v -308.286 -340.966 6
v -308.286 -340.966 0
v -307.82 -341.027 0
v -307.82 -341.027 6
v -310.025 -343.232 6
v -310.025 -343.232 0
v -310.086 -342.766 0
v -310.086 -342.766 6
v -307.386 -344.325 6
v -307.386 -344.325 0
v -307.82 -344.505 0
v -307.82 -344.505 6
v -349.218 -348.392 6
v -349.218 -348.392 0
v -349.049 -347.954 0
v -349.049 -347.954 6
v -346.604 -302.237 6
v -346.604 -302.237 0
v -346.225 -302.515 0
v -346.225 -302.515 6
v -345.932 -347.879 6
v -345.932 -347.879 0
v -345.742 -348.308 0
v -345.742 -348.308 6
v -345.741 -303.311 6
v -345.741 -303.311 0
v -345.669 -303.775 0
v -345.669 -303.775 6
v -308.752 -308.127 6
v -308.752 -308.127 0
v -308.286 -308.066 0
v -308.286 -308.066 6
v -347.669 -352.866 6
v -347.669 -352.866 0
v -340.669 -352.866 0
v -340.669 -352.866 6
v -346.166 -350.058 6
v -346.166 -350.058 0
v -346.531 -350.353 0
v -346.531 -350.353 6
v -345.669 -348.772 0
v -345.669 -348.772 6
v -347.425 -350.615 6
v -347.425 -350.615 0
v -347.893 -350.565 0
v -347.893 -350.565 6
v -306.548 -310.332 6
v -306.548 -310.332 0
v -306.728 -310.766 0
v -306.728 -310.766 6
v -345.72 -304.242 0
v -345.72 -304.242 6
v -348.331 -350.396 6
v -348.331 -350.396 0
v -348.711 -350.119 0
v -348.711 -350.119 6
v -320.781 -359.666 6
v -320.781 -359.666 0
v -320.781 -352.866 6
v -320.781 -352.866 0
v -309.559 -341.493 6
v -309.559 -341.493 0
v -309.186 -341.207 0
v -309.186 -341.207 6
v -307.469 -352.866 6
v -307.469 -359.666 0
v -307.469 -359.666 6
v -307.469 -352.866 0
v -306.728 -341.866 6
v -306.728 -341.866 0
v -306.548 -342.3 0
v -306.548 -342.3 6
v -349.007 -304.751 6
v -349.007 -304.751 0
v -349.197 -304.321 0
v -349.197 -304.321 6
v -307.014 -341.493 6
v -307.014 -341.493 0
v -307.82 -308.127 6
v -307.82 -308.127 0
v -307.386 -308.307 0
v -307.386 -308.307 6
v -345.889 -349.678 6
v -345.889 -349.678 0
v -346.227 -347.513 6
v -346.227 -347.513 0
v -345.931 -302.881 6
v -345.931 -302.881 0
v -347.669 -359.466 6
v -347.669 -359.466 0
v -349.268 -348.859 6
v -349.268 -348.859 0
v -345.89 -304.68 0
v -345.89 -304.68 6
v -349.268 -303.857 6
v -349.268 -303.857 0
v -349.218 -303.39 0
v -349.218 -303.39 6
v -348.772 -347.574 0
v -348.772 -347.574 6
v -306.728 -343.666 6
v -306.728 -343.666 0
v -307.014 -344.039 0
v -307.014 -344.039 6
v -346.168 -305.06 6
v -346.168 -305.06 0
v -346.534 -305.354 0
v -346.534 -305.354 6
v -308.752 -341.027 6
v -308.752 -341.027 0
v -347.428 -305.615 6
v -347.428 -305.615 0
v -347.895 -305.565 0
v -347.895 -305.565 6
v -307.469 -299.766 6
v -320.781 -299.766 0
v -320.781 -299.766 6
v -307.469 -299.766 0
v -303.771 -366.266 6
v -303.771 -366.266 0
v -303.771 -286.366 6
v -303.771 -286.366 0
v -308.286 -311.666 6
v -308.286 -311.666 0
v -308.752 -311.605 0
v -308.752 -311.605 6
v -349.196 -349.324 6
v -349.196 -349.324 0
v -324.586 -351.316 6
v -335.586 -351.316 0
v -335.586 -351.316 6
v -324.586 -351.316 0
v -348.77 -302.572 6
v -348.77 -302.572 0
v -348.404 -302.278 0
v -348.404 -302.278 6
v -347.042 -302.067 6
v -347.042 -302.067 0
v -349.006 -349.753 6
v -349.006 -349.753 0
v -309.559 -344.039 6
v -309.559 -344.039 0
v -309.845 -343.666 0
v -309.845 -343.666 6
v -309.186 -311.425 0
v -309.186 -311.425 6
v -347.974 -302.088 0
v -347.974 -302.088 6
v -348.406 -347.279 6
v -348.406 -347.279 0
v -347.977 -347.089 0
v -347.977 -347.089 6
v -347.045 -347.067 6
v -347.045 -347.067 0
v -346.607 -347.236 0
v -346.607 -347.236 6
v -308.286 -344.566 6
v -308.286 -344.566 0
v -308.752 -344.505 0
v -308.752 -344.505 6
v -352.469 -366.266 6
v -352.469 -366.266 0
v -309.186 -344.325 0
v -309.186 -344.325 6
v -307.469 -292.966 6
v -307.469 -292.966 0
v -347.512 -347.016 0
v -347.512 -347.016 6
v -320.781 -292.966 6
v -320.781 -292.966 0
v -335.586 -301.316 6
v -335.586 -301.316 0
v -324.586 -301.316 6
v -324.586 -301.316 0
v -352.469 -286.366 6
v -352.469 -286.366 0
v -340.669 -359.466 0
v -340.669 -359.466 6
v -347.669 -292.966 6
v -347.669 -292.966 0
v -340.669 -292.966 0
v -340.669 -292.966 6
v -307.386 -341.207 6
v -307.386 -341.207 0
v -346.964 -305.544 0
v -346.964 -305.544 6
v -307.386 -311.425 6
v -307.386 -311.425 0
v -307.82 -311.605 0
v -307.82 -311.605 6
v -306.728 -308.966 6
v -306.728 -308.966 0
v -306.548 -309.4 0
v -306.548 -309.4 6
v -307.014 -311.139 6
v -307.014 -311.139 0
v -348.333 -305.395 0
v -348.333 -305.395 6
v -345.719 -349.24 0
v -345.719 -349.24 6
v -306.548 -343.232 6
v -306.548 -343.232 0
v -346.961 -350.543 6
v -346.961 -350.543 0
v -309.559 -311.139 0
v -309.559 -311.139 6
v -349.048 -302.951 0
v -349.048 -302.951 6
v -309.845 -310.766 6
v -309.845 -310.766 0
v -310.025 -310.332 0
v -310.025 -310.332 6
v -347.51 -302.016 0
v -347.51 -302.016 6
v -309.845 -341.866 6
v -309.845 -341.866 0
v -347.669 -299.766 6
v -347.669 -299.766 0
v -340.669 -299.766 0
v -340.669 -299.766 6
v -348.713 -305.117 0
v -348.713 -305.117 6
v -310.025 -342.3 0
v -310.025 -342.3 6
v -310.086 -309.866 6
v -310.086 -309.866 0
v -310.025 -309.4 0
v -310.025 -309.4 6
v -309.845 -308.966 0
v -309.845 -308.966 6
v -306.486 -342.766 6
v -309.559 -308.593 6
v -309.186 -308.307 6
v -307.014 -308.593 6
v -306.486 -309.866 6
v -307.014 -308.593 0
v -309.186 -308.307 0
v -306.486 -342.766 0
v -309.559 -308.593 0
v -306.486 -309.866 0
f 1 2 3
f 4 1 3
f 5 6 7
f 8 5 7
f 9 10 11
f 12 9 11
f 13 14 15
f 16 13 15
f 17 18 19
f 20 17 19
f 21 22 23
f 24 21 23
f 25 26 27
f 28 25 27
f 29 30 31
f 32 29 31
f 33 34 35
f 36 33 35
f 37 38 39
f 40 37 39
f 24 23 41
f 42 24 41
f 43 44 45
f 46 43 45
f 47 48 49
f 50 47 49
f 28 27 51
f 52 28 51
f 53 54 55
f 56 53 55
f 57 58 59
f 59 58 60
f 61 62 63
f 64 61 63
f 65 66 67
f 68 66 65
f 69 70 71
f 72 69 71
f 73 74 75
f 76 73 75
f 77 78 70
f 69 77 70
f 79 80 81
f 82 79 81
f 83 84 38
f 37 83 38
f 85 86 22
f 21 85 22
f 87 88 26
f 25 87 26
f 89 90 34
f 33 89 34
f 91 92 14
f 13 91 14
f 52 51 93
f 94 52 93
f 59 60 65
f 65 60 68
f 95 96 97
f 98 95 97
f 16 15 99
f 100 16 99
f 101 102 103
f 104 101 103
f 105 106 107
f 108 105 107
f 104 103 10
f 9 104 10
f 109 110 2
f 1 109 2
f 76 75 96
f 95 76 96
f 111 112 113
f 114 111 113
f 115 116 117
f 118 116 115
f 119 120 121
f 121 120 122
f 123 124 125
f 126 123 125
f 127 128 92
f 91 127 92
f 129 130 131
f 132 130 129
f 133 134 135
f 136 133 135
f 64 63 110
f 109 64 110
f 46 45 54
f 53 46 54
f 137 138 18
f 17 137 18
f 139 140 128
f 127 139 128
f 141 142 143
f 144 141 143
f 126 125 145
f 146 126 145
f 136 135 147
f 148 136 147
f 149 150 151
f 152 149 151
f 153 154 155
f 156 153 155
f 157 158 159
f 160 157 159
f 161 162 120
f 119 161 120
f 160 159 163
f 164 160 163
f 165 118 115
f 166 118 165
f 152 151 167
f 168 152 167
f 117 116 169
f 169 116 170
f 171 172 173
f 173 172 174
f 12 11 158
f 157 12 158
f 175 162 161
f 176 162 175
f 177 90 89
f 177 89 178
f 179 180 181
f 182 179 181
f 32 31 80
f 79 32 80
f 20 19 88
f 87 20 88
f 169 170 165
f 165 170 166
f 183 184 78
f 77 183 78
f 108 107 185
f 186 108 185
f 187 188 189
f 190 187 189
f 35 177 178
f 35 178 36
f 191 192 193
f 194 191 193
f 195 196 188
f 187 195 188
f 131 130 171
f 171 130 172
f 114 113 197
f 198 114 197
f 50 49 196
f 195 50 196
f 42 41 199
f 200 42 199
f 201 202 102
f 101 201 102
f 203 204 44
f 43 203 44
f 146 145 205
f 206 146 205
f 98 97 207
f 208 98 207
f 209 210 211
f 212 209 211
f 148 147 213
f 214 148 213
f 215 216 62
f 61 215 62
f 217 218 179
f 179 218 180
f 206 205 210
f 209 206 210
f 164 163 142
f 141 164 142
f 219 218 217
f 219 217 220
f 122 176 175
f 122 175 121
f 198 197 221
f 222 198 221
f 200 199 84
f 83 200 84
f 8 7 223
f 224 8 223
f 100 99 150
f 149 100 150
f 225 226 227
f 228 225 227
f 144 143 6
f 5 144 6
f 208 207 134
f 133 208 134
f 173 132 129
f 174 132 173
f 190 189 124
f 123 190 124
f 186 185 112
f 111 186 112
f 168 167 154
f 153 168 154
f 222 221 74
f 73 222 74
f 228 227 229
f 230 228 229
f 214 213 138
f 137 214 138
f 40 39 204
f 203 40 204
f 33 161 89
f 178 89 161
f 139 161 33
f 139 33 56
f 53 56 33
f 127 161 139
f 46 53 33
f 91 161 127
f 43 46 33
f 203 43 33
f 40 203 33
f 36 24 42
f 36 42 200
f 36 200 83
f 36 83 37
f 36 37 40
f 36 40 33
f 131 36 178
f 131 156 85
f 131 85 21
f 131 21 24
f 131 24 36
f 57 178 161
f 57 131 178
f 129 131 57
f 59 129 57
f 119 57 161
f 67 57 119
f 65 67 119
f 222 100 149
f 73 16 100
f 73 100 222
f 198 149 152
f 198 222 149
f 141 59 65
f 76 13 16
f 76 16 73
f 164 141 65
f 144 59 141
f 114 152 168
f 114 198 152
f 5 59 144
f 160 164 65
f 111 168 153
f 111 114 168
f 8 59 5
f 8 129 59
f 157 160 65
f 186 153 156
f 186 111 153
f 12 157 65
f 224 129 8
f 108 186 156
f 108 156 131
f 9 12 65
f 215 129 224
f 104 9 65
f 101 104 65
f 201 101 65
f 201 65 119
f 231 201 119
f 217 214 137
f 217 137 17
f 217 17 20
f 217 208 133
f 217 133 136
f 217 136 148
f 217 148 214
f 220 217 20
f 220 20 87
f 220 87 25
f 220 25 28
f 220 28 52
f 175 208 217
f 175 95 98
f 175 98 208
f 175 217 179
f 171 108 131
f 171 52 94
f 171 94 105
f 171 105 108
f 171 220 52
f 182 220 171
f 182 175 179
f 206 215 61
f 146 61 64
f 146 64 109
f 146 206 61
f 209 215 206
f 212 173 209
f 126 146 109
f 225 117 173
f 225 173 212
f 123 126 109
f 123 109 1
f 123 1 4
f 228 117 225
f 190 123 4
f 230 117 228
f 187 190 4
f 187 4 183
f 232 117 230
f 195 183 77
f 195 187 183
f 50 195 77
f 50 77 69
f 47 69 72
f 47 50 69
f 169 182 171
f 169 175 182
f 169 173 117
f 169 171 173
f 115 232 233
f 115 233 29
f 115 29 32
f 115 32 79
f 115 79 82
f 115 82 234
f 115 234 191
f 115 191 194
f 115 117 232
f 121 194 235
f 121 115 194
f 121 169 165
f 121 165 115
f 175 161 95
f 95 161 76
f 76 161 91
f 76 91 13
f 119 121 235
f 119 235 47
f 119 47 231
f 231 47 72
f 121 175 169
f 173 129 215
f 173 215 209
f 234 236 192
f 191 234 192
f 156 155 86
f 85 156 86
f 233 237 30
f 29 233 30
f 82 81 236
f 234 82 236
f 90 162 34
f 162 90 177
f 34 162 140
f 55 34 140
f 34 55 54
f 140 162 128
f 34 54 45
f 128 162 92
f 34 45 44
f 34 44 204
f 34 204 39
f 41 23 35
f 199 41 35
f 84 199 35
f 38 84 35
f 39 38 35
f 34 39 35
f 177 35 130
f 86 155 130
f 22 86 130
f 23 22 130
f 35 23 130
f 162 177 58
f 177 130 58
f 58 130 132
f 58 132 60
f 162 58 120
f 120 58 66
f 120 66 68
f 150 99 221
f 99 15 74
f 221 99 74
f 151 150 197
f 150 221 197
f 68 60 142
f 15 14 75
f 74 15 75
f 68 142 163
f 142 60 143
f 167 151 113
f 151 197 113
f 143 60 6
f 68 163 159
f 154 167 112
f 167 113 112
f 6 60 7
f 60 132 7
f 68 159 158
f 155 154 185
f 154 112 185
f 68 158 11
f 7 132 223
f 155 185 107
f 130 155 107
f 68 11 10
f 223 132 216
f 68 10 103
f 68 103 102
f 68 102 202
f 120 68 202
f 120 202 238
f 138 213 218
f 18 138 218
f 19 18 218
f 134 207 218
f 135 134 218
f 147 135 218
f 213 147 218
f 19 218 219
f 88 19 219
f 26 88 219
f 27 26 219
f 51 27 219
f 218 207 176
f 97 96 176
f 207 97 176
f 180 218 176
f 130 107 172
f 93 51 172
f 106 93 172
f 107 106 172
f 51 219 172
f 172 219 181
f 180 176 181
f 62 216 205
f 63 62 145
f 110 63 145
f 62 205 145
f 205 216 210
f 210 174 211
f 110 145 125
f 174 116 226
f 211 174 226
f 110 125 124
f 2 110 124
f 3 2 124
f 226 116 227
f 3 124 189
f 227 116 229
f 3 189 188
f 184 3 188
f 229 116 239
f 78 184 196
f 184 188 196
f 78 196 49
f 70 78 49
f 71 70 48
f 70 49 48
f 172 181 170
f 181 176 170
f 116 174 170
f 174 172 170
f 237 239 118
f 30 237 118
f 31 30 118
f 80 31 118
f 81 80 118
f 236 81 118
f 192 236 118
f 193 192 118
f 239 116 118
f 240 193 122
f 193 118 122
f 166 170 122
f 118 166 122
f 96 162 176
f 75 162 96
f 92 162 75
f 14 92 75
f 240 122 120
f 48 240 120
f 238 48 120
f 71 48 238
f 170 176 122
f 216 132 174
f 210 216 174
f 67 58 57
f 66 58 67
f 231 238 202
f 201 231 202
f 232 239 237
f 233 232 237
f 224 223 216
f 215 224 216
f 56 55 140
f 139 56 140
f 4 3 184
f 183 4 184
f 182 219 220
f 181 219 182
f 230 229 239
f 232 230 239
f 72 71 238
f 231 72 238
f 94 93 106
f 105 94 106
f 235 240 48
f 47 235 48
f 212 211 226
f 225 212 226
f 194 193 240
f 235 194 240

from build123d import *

# Parameters (mm, degrees)
SKETCH1_W           = 48.698269881
SKETCH1_H           = 79.9
SKETCH1_W_2         = 13.312275424
SKETCH1_H_2         = 6.8
SKETCH1_W_3         = 7
SKETCH1_H_3         = 6.6
SKETCH1_W_4         = 10.999995004
SKETCH1_H_4         = 49.999979698
BOSS_EXTRUDE1_DEPTH = 6


with BuildPart() as part:
    # Sketch1 → Boss-Extrude1 (new body)
    with BuildSketch(Plane.XY):
        with Locations((-328.119749272, -326.315940756)):
            Rectangle(SKETCH1_W, SKETCH1_H)
        Polygon((-306.547681314, -310.331815037), (-306.727502074, -310.765940756), (-307.013555595, -311.138732962), (-307.386347801, -311.424786483), (-307.82047352, -311.604607243), (-308.286347801, -311.665940756), (-308.752222082, -311.604607243), (-309.186347801, -311.424786483), (-309.559140007, -311.138732962), (-309.845193528, -310.765940756), (-310.025014288, -310.331815037), (-310.086347801, -309.865940756), (-310.025014288, -309.400066475), (-309.845193528, -308.965940756), (-309.559140007, -308.59314855), (-309.186347801, -308.307095029), (-308.752222082, -308.127274269), (-308.286347801, -308.065940756), (-307.82047352, -308.127274269), (-307.386347801, -308.307095029), (-307.013555595, -308.59314855), (-306.727502074, -308.965940756), (-306.547681314, -309.400066475), (-306.486347801, -309.865940756), align=None, mode=Mode.SUBTRACT)
        with Locations((-314.125021924, -356.265940756)):
            Rectangle(SKETCH1_W_2, SKETCH1_H_2, mode=Mode.SUBTRACT)
        with Locations((-344.168884212, -356.165940756)):
            Rectangle(SKETCH1_W_3, SKETCH1_H_3, mode=Mode.SUBTRACT)
        with Locations((-314.125021924, -296.365940756)):
            Rectangle(SKETCH1_W_2, SKETCH1_H_2, mode=Mode.SUBTRACT)
        Polygon((-349.005509995, -349.753374061), (-349.195776334, -349.323723778), (-349.268357829, -348.859468921), (-349.218308171, -348.392247692), (-349.04903816, -347.953900444), (-348.77208327, -347.574299819), (-348.406317517, -347.279314973), (-347.976667234, -347.089048634), (-347.512412377, -347.016467139), (-347.045191148, -347.066516797), (-346.6068439, -347.235786808), (-346.227243275, -347.512741698), (-345.932258429, -347.878507451), (-345.74199209, -348.308157734), (-345.669410595, -348.772412591), (-345.719460253, -349.23963382), (-345.888730263, -349.677981068), (-346.165685154, -350.057581692), (-346.531450907, -350.352566539), (-346.96110119, -350.542832878), (-347.425356047, -350.615414373), (-347.892577276, -350.565364715), (-348.330924524, -350.396094704), (-348.710525148, -350.119139814), align=None, mode=Mode.SUBTRACT)
        Polygon((-307.013555595, -341.49314855), (-306.727502074, -341.865940756), (-306.547681314, -342.300066475), (-306.486347801, -342.765940756), (-306.547681314, -343.231815037), (-306.727502074, -343.665940756), (-307.013555595, -344.038732962), (-307.386347801, -344.324786483), (-307.82047352, -344.504607243), (-308.286347801, -344.565940756), (-308.752222082, -344.504607243), (-309.186347801, -344.324786483), (-309.559140007, -344.038732962), (-309.845193528, -343.665940756), (-310.025014288, -343.231815037), (-310.086347801, -342.765940756), (-310.025014288, -342.300066475), (-309.845193528, -341.865940756), (-309.559140007, -341.49314855), (-309.186347801, -341.207095029), (-308.752222082, -341.027274269), (-308.286347801, -340.965940756), (-307.82047352, -341.027274269), (-307.386347801, -341.207095029), align=None, mode=Mode.SUBTRACT)
        Polygon((-347.042471777, -302.06717764), (-346.604388229, -302.237128957), (-346.225218653, -302.51467369), (-345.93080283, -302.880897622), (-345.741204711, -303.310843199), (-345.669345095, -303.77521034), (-345.720121096, -304.242353191), (-345.890072413, -304.680436739), (-346.167617146, -305.059606315), (-346.533841078, -305.354022138), (-346.963786655, -305.543620257), (-347.428153795, -305.615479873), (-347.895296647, -305.564703872), (-348.333380195, -305.394752555), (-348.712549771, -305.117207822), (-349.006965594, -304.75098389), (-349.196563713, -304.321038313), (-349.268423329, -303.856671172), (-349.217647328, -303.389528321), (-349.047696011, -302.951444773), (-348.770151278, -302.572275197), (-348.403927346, -302.277859374), (-347.973981769, -302.088261255), (-347.509614628, -302.016401639), align=None, mode=Mode.SUBTRACT)
        with Locations((-344.168884212, -296.365940756)):
            Rectangle(SKETCH1_W_3, SKETCH1_H_2, mode=Mode.SUBTRACT)
        with Locations((-330.086347801, -326.315940756)):
            Rectangle(SKETCH1_W_4, SKETCH1_H_4, mode=Mode.SUBTRACT)
    extrude(amount=BOSS_EXTRUDE1_DEPTH)


solid = part.part
